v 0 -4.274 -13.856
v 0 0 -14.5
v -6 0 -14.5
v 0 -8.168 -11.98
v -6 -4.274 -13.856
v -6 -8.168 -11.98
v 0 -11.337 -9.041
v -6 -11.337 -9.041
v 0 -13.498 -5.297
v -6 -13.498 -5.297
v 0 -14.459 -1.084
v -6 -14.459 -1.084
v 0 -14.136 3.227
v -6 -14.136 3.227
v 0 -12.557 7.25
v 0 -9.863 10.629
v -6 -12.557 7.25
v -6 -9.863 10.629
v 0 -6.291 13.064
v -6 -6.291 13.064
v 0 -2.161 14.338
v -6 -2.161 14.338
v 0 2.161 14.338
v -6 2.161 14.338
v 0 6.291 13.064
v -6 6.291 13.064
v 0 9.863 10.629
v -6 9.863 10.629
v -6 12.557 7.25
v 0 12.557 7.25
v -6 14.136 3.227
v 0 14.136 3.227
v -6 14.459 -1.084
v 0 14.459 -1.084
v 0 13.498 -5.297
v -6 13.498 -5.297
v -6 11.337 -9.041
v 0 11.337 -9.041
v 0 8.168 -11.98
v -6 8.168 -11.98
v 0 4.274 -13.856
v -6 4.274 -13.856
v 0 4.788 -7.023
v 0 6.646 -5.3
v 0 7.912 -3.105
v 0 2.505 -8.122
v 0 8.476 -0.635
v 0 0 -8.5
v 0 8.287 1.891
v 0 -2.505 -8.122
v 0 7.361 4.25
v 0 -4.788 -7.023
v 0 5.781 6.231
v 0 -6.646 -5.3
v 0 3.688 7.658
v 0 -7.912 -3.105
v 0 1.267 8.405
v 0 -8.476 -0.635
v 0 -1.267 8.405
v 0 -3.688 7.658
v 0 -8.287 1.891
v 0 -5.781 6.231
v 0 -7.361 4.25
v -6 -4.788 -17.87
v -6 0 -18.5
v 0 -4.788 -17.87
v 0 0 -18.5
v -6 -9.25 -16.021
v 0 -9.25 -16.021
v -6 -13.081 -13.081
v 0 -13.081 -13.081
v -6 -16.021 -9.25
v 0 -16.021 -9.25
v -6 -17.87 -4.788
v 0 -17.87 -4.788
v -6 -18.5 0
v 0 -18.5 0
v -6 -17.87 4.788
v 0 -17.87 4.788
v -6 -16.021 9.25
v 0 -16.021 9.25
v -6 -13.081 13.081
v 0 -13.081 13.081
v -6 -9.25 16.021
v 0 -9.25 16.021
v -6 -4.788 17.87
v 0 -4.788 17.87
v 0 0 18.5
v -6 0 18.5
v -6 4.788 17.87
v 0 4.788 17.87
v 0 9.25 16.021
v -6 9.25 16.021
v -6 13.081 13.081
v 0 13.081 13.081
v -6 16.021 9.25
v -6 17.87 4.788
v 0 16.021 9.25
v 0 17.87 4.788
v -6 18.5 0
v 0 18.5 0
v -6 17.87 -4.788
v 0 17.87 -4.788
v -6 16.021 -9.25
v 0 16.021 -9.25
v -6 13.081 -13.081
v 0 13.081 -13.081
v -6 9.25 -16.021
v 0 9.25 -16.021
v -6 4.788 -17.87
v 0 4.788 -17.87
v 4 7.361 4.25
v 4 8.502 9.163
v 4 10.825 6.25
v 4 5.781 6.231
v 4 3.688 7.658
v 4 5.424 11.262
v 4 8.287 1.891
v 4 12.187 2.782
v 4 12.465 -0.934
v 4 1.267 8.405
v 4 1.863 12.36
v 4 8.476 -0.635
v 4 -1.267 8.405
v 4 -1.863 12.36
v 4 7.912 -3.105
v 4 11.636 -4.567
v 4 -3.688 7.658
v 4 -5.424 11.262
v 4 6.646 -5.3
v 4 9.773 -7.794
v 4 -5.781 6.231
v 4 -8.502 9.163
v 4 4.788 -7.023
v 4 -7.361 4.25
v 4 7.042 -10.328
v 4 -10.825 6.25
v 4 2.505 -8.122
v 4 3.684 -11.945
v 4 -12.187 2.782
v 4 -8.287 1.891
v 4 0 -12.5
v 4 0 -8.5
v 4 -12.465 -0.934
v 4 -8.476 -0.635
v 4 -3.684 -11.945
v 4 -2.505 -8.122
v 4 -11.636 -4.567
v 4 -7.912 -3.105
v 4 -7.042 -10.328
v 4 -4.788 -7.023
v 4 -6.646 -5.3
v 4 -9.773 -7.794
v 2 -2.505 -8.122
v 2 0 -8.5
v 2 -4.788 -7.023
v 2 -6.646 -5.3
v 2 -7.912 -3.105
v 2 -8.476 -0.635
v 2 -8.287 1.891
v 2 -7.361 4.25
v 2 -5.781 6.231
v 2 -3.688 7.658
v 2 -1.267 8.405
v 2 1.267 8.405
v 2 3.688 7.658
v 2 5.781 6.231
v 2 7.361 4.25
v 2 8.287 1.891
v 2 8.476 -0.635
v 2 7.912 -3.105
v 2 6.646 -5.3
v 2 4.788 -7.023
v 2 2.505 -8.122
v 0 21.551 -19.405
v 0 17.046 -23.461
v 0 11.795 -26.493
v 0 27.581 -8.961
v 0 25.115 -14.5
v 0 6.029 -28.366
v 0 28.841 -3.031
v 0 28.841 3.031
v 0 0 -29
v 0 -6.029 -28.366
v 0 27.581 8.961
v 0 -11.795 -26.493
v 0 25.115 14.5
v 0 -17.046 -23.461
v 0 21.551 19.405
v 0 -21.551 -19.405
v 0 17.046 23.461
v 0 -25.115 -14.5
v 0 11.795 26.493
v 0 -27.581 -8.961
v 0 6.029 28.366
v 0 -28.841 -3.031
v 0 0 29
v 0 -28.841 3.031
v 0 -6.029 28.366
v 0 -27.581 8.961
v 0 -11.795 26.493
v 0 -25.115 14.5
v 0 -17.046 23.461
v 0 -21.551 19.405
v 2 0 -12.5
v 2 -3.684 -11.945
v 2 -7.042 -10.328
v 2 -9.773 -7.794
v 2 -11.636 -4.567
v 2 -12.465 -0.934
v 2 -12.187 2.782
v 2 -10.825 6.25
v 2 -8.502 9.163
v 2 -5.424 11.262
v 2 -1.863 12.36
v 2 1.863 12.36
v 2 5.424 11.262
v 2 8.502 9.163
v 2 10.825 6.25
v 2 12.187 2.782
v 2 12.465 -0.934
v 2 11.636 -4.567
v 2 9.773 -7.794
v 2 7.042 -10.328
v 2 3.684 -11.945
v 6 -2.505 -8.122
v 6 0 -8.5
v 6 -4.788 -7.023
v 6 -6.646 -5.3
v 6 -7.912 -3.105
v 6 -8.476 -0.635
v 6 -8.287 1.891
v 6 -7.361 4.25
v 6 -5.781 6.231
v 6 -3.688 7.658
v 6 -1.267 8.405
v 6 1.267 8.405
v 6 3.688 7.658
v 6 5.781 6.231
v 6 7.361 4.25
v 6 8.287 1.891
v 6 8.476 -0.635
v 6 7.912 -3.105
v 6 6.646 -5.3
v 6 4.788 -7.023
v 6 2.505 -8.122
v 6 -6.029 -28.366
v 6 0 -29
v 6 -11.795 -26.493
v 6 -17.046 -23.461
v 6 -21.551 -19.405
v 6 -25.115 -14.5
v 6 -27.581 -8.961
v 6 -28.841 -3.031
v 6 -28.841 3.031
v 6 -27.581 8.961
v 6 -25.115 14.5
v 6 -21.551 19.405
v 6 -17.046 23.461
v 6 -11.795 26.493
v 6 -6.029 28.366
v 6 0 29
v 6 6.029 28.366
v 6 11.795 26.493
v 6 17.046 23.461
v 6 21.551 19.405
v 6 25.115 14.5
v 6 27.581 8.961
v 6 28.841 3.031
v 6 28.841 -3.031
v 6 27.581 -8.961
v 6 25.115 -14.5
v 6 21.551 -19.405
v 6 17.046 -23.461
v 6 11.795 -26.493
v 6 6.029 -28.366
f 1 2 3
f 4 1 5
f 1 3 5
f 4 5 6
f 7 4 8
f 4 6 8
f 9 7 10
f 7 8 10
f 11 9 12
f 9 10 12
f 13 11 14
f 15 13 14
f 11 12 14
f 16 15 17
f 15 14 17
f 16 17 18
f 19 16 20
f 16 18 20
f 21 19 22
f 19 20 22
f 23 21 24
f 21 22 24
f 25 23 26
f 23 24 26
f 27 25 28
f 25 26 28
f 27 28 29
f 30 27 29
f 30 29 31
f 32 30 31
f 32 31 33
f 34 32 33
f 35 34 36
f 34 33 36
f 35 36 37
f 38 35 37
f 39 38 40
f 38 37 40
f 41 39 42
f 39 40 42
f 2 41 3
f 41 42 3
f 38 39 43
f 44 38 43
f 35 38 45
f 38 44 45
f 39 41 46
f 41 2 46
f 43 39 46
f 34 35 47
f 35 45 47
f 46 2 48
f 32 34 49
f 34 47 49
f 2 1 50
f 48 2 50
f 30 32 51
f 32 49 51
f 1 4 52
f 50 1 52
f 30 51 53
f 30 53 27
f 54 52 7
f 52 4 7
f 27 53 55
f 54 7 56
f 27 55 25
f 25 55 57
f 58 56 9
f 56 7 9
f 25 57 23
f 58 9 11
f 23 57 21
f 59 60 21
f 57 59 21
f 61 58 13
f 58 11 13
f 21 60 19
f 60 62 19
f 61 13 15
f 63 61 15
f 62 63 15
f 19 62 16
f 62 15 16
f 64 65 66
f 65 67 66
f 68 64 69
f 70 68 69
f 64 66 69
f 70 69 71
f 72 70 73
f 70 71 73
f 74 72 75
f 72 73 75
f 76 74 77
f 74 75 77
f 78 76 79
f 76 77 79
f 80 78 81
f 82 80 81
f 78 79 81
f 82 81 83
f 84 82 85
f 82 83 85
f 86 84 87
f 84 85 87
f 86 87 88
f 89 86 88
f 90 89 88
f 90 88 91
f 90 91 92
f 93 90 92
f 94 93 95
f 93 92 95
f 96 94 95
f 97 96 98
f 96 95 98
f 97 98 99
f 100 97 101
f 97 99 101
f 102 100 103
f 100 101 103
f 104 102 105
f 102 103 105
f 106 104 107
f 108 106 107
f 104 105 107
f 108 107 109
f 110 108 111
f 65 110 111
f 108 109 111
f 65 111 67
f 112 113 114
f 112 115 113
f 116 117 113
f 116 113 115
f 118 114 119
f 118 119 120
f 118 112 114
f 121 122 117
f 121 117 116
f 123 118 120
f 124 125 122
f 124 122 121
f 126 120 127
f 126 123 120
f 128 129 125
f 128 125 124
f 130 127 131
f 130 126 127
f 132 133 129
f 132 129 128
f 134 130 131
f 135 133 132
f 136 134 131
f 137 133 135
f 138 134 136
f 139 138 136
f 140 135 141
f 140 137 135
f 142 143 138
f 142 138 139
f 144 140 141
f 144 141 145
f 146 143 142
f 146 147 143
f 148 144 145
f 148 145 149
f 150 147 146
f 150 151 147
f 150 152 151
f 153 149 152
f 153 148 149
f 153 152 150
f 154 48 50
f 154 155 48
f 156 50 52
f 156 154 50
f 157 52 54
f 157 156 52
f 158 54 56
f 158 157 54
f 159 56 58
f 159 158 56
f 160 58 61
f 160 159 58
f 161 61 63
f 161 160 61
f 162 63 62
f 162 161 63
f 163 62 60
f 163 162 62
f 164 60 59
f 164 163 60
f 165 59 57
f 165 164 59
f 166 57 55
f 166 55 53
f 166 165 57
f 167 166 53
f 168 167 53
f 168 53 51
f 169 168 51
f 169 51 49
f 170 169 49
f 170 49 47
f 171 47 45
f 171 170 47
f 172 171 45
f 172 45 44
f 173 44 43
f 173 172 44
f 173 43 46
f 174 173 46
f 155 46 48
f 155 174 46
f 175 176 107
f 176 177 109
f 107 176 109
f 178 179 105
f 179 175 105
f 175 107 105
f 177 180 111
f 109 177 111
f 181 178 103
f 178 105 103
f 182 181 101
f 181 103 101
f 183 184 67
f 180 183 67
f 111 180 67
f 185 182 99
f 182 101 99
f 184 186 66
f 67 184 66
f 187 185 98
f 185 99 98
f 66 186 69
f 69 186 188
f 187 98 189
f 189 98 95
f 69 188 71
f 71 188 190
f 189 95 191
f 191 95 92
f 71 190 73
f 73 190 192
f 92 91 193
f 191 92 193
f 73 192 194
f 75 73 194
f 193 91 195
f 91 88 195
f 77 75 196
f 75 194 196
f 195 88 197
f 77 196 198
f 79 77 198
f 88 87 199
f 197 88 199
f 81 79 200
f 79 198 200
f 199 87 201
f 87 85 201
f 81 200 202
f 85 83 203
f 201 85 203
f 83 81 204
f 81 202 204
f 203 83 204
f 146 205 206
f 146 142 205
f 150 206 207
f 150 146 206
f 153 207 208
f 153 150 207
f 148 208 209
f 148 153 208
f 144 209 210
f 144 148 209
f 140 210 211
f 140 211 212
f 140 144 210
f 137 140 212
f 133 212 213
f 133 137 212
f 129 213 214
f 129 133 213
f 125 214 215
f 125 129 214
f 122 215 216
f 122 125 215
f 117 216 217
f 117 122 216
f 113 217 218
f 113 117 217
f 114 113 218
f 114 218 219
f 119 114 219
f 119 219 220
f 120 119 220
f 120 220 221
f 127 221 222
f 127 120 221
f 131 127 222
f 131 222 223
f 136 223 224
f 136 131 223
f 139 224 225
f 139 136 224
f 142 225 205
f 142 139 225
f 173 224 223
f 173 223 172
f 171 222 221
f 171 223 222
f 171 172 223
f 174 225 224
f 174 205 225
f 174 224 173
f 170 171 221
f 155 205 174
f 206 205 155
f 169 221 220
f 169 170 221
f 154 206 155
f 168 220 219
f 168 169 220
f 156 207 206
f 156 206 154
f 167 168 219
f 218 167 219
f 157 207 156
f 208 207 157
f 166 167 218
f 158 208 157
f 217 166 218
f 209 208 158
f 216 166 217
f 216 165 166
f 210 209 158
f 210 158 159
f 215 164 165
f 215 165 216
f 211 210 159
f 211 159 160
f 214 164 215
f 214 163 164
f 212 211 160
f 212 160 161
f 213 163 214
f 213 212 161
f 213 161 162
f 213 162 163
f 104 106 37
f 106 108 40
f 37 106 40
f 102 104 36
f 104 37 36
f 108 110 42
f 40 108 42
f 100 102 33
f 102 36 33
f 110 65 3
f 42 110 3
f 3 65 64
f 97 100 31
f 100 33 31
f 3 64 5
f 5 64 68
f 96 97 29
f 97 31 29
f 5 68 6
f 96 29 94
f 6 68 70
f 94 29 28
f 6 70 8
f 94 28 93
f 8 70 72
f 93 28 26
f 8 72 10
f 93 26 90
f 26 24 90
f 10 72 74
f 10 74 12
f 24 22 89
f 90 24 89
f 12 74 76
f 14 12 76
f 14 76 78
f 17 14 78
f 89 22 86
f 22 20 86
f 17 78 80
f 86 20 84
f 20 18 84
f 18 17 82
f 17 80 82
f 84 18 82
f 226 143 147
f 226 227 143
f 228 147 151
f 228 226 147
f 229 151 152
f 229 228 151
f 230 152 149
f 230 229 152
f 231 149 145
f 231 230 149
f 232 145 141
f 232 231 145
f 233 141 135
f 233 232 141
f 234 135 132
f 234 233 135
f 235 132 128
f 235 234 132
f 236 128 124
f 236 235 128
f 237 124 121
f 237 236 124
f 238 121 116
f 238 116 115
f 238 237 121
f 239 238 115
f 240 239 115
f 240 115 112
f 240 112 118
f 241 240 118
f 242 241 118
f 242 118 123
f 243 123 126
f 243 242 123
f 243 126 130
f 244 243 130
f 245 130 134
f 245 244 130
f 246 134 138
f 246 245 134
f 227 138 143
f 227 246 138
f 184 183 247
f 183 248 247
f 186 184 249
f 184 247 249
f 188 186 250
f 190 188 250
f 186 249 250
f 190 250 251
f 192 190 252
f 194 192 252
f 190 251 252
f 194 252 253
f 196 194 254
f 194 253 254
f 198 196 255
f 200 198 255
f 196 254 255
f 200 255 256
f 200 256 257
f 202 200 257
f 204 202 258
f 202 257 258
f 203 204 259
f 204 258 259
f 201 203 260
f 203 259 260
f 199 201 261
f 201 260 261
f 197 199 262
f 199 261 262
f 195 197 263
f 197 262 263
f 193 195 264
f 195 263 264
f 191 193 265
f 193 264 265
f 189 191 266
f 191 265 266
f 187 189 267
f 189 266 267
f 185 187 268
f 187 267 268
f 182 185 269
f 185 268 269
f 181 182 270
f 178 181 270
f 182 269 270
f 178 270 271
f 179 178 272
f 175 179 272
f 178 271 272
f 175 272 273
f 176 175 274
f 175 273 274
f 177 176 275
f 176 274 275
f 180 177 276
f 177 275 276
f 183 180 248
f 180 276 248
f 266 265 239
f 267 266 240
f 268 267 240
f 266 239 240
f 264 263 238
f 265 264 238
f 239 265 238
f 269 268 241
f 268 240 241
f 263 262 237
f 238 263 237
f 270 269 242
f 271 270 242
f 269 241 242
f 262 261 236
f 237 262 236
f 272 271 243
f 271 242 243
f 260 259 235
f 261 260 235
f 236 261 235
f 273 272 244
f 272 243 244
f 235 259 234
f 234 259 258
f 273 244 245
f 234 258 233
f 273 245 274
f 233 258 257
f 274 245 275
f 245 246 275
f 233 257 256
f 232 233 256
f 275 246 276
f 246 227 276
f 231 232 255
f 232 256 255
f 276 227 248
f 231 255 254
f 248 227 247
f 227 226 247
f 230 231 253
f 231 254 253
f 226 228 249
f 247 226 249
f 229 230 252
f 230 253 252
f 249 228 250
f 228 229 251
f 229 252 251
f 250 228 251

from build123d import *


with BuildPart() as part:
    # 草图1 → 旋转1 (revolve)
    with BuildSketch(Plane.XY, mode=Mode.PRIVATE) as revolve_1_sk:
        Polygon((0, 0), (0, 14.5), (-6, 14.5), (-6, 18.5), (0, 18.5), (0, 29), (6, 29), (6, 0), align=None)
    revolve(revolve_1_sk.sketch.rotate(Axis((0, 0, 0), (-1, 0, 0)), 90), axis=Axis((0, 0, 0), (-1, 0, 0)))

    # 草图2 → 切除-旋转1 (revolve, cut)
    with BuildSketch(Plane.XY, mode=Mode.PRIVATE) as cut_revolve_1_sk:
        Polygon((0, 0), (0, 8.5), (2, 8.5), (2, 12.5), (4, 12.5), (4, 8.5), (6, 8.5), (6, 0), align=None)
    revolve(cut_revolve_1_sk.sketch.rotate(Axis((0, 0, 0), (-1, 0, 0)), 90), axis=Axis((0, 0, 0), (-1, 0, 0)), mode=Mode.SUBTRACT)


solid = part.part
